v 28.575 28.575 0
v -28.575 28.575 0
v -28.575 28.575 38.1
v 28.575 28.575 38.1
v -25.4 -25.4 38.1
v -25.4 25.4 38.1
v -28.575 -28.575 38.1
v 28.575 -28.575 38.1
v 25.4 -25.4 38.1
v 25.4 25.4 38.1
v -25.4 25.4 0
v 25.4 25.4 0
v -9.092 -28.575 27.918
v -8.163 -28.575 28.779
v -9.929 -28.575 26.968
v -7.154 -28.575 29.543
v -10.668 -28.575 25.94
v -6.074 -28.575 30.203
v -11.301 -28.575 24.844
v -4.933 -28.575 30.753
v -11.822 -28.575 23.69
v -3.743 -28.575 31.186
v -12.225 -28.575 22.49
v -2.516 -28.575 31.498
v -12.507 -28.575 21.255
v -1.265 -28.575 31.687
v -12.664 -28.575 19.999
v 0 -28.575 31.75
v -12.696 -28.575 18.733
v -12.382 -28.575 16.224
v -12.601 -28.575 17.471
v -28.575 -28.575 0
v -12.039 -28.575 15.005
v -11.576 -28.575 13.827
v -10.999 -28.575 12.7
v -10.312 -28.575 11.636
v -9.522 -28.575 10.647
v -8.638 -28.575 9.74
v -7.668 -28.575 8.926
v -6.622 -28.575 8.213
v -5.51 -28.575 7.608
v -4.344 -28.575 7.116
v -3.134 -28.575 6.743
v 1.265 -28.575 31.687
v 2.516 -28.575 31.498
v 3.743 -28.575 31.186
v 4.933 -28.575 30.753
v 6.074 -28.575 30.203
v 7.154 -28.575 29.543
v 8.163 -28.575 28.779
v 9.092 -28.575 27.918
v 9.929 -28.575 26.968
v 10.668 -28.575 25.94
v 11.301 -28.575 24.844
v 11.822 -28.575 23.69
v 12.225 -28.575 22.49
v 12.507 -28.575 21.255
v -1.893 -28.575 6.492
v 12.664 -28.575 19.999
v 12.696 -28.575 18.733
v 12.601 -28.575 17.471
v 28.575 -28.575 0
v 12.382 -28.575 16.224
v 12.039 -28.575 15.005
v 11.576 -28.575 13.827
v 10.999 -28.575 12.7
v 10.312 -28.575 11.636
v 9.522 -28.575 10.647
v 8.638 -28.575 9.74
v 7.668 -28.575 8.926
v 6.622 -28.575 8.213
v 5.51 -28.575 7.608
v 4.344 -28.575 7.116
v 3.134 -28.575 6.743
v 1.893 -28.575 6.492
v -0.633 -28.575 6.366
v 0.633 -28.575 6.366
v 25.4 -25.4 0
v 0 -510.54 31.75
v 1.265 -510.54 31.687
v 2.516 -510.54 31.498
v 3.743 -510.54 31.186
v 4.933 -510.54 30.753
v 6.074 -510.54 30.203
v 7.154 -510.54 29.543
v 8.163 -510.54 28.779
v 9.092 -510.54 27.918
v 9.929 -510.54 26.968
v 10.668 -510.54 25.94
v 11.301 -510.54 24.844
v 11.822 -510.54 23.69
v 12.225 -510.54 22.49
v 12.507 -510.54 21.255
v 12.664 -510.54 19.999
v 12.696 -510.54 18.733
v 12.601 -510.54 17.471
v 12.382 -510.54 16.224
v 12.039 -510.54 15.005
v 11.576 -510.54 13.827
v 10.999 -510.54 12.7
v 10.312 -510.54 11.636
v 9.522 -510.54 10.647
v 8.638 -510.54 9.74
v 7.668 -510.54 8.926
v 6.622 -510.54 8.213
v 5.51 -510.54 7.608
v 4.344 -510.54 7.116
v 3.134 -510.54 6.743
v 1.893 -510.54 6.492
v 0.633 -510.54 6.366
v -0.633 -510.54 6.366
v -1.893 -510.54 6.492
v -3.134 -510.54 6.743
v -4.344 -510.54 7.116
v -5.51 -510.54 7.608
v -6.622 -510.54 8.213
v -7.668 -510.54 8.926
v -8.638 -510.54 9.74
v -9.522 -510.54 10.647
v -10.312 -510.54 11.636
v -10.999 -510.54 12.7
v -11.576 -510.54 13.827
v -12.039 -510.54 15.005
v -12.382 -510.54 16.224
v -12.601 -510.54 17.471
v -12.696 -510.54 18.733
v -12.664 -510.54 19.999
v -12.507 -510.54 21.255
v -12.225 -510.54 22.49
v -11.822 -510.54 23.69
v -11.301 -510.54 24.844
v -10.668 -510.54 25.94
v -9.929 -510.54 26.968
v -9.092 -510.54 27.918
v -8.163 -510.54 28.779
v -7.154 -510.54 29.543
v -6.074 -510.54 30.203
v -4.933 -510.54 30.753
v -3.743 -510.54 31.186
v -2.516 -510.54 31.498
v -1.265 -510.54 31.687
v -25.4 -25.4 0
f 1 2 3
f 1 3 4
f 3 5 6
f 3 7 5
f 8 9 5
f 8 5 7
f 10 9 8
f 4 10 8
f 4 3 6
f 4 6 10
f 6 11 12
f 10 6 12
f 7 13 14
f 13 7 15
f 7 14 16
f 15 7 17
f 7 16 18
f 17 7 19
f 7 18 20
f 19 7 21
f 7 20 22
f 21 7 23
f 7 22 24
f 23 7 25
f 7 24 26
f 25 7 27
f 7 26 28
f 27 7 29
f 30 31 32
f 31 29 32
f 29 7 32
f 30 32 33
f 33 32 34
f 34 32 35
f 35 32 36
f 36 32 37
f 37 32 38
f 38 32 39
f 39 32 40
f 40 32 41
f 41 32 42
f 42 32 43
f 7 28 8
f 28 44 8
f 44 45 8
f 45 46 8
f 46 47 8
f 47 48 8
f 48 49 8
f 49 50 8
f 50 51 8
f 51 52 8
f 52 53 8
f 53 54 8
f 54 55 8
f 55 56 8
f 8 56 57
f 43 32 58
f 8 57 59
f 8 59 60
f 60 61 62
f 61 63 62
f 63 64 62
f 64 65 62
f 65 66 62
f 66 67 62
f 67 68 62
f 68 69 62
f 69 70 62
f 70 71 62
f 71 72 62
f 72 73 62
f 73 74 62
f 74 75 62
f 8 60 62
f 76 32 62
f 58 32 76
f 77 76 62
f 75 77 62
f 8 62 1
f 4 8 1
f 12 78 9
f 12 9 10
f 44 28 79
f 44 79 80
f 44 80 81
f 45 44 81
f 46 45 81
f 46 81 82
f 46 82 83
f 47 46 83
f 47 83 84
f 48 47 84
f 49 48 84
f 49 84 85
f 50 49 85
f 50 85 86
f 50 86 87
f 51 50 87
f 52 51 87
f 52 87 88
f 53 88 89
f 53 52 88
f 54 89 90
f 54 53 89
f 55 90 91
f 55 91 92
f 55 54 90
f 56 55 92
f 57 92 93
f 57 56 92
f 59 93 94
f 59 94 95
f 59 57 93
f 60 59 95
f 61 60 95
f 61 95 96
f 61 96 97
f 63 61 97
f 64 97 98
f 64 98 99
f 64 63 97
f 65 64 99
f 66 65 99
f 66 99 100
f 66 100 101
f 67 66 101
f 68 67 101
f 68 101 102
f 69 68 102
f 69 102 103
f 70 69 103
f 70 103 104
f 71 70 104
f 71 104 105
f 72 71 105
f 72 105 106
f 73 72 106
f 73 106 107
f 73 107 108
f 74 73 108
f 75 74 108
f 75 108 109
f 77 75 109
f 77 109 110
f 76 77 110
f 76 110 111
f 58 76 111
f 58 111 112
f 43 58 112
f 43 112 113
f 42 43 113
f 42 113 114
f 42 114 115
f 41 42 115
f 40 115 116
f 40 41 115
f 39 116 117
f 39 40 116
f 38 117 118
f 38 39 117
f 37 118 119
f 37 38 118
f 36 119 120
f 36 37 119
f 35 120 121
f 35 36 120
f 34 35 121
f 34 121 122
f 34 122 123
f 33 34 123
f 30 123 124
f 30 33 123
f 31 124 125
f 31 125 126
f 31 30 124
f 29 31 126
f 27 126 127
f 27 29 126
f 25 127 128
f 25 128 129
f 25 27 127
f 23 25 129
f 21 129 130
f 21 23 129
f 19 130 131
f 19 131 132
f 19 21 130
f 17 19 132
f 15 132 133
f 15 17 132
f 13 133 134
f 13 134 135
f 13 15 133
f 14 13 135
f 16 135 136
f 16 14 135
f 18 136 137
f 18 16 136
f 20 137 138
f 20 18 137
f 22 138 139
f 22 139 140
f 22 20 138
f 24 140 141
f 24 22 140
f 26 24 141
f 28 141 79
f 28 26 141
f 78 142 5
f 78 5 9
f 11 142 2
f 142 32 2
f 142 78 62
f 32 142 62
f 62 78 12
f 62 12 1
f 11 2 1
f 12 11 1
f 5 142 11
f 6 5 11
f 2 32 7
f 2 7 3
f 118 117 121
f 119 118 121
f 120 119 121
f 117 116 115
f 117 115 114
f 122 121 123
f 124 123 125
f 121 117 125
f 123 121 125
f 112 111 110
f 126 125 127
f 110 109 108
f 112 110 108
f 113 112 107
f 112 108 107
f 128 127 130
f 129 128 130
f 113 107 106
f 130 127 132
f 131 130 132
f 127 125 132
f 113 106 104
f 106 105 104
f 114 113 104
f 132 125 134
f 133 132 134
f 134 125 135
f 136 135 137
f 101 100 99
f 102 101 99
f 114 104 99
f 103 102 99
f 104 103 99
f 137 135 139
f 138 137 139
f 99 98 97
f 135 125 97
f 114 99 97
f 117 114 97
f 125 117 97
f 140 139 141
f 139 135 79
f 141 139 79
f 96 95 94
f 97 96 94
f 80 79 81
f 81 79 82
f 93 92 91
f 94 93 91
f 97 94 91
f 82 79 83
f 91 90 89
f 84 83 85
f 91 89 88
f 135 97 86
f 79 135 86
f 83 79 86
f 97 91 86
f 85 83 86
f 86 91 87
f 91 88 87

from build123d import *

# Parameters (mm, degrees)
SKETCH1_W           = 57.15
SKETCH1_H           = 57.15
SKETCH1_W_2         = 50.8
SKETCH1_H_2         = 50.8
BOSS_EXTRUDE1_DEPTH = 38.1
SKETCH4_R           = 12.7
BOSS_EXTRUDE2_DEPTH = 482.6


with BuildPart() as part:
    # Sketch1 → Boss-Extrude1 (new body)
    with BuildSketch(Plane.XY):
        Rectangle(SKETCH1_W, SKETCH1_H)
        Rectangle(SKETCH1_W_2, SKETCH1_H_2, mode=Mode.SUBTRACT)
    extrude(amount=BOSS_EXTRUDE1_DEPTH)

    # Sketch4 → Boss-Extrude2 (add)
    with BuildSketch(Plane(origin=(0, -27.94, 0), x_dir=(1, 0, 0), z_dir=(0, 1, 0))):
        with Locations(Location((0, -19.05, 0), (0, 0, 270))):
            Circle(SKETCH4_R)
    extrude(amount=-BOSS_EXTRUDE2_DEPTH)


solid = part.part
